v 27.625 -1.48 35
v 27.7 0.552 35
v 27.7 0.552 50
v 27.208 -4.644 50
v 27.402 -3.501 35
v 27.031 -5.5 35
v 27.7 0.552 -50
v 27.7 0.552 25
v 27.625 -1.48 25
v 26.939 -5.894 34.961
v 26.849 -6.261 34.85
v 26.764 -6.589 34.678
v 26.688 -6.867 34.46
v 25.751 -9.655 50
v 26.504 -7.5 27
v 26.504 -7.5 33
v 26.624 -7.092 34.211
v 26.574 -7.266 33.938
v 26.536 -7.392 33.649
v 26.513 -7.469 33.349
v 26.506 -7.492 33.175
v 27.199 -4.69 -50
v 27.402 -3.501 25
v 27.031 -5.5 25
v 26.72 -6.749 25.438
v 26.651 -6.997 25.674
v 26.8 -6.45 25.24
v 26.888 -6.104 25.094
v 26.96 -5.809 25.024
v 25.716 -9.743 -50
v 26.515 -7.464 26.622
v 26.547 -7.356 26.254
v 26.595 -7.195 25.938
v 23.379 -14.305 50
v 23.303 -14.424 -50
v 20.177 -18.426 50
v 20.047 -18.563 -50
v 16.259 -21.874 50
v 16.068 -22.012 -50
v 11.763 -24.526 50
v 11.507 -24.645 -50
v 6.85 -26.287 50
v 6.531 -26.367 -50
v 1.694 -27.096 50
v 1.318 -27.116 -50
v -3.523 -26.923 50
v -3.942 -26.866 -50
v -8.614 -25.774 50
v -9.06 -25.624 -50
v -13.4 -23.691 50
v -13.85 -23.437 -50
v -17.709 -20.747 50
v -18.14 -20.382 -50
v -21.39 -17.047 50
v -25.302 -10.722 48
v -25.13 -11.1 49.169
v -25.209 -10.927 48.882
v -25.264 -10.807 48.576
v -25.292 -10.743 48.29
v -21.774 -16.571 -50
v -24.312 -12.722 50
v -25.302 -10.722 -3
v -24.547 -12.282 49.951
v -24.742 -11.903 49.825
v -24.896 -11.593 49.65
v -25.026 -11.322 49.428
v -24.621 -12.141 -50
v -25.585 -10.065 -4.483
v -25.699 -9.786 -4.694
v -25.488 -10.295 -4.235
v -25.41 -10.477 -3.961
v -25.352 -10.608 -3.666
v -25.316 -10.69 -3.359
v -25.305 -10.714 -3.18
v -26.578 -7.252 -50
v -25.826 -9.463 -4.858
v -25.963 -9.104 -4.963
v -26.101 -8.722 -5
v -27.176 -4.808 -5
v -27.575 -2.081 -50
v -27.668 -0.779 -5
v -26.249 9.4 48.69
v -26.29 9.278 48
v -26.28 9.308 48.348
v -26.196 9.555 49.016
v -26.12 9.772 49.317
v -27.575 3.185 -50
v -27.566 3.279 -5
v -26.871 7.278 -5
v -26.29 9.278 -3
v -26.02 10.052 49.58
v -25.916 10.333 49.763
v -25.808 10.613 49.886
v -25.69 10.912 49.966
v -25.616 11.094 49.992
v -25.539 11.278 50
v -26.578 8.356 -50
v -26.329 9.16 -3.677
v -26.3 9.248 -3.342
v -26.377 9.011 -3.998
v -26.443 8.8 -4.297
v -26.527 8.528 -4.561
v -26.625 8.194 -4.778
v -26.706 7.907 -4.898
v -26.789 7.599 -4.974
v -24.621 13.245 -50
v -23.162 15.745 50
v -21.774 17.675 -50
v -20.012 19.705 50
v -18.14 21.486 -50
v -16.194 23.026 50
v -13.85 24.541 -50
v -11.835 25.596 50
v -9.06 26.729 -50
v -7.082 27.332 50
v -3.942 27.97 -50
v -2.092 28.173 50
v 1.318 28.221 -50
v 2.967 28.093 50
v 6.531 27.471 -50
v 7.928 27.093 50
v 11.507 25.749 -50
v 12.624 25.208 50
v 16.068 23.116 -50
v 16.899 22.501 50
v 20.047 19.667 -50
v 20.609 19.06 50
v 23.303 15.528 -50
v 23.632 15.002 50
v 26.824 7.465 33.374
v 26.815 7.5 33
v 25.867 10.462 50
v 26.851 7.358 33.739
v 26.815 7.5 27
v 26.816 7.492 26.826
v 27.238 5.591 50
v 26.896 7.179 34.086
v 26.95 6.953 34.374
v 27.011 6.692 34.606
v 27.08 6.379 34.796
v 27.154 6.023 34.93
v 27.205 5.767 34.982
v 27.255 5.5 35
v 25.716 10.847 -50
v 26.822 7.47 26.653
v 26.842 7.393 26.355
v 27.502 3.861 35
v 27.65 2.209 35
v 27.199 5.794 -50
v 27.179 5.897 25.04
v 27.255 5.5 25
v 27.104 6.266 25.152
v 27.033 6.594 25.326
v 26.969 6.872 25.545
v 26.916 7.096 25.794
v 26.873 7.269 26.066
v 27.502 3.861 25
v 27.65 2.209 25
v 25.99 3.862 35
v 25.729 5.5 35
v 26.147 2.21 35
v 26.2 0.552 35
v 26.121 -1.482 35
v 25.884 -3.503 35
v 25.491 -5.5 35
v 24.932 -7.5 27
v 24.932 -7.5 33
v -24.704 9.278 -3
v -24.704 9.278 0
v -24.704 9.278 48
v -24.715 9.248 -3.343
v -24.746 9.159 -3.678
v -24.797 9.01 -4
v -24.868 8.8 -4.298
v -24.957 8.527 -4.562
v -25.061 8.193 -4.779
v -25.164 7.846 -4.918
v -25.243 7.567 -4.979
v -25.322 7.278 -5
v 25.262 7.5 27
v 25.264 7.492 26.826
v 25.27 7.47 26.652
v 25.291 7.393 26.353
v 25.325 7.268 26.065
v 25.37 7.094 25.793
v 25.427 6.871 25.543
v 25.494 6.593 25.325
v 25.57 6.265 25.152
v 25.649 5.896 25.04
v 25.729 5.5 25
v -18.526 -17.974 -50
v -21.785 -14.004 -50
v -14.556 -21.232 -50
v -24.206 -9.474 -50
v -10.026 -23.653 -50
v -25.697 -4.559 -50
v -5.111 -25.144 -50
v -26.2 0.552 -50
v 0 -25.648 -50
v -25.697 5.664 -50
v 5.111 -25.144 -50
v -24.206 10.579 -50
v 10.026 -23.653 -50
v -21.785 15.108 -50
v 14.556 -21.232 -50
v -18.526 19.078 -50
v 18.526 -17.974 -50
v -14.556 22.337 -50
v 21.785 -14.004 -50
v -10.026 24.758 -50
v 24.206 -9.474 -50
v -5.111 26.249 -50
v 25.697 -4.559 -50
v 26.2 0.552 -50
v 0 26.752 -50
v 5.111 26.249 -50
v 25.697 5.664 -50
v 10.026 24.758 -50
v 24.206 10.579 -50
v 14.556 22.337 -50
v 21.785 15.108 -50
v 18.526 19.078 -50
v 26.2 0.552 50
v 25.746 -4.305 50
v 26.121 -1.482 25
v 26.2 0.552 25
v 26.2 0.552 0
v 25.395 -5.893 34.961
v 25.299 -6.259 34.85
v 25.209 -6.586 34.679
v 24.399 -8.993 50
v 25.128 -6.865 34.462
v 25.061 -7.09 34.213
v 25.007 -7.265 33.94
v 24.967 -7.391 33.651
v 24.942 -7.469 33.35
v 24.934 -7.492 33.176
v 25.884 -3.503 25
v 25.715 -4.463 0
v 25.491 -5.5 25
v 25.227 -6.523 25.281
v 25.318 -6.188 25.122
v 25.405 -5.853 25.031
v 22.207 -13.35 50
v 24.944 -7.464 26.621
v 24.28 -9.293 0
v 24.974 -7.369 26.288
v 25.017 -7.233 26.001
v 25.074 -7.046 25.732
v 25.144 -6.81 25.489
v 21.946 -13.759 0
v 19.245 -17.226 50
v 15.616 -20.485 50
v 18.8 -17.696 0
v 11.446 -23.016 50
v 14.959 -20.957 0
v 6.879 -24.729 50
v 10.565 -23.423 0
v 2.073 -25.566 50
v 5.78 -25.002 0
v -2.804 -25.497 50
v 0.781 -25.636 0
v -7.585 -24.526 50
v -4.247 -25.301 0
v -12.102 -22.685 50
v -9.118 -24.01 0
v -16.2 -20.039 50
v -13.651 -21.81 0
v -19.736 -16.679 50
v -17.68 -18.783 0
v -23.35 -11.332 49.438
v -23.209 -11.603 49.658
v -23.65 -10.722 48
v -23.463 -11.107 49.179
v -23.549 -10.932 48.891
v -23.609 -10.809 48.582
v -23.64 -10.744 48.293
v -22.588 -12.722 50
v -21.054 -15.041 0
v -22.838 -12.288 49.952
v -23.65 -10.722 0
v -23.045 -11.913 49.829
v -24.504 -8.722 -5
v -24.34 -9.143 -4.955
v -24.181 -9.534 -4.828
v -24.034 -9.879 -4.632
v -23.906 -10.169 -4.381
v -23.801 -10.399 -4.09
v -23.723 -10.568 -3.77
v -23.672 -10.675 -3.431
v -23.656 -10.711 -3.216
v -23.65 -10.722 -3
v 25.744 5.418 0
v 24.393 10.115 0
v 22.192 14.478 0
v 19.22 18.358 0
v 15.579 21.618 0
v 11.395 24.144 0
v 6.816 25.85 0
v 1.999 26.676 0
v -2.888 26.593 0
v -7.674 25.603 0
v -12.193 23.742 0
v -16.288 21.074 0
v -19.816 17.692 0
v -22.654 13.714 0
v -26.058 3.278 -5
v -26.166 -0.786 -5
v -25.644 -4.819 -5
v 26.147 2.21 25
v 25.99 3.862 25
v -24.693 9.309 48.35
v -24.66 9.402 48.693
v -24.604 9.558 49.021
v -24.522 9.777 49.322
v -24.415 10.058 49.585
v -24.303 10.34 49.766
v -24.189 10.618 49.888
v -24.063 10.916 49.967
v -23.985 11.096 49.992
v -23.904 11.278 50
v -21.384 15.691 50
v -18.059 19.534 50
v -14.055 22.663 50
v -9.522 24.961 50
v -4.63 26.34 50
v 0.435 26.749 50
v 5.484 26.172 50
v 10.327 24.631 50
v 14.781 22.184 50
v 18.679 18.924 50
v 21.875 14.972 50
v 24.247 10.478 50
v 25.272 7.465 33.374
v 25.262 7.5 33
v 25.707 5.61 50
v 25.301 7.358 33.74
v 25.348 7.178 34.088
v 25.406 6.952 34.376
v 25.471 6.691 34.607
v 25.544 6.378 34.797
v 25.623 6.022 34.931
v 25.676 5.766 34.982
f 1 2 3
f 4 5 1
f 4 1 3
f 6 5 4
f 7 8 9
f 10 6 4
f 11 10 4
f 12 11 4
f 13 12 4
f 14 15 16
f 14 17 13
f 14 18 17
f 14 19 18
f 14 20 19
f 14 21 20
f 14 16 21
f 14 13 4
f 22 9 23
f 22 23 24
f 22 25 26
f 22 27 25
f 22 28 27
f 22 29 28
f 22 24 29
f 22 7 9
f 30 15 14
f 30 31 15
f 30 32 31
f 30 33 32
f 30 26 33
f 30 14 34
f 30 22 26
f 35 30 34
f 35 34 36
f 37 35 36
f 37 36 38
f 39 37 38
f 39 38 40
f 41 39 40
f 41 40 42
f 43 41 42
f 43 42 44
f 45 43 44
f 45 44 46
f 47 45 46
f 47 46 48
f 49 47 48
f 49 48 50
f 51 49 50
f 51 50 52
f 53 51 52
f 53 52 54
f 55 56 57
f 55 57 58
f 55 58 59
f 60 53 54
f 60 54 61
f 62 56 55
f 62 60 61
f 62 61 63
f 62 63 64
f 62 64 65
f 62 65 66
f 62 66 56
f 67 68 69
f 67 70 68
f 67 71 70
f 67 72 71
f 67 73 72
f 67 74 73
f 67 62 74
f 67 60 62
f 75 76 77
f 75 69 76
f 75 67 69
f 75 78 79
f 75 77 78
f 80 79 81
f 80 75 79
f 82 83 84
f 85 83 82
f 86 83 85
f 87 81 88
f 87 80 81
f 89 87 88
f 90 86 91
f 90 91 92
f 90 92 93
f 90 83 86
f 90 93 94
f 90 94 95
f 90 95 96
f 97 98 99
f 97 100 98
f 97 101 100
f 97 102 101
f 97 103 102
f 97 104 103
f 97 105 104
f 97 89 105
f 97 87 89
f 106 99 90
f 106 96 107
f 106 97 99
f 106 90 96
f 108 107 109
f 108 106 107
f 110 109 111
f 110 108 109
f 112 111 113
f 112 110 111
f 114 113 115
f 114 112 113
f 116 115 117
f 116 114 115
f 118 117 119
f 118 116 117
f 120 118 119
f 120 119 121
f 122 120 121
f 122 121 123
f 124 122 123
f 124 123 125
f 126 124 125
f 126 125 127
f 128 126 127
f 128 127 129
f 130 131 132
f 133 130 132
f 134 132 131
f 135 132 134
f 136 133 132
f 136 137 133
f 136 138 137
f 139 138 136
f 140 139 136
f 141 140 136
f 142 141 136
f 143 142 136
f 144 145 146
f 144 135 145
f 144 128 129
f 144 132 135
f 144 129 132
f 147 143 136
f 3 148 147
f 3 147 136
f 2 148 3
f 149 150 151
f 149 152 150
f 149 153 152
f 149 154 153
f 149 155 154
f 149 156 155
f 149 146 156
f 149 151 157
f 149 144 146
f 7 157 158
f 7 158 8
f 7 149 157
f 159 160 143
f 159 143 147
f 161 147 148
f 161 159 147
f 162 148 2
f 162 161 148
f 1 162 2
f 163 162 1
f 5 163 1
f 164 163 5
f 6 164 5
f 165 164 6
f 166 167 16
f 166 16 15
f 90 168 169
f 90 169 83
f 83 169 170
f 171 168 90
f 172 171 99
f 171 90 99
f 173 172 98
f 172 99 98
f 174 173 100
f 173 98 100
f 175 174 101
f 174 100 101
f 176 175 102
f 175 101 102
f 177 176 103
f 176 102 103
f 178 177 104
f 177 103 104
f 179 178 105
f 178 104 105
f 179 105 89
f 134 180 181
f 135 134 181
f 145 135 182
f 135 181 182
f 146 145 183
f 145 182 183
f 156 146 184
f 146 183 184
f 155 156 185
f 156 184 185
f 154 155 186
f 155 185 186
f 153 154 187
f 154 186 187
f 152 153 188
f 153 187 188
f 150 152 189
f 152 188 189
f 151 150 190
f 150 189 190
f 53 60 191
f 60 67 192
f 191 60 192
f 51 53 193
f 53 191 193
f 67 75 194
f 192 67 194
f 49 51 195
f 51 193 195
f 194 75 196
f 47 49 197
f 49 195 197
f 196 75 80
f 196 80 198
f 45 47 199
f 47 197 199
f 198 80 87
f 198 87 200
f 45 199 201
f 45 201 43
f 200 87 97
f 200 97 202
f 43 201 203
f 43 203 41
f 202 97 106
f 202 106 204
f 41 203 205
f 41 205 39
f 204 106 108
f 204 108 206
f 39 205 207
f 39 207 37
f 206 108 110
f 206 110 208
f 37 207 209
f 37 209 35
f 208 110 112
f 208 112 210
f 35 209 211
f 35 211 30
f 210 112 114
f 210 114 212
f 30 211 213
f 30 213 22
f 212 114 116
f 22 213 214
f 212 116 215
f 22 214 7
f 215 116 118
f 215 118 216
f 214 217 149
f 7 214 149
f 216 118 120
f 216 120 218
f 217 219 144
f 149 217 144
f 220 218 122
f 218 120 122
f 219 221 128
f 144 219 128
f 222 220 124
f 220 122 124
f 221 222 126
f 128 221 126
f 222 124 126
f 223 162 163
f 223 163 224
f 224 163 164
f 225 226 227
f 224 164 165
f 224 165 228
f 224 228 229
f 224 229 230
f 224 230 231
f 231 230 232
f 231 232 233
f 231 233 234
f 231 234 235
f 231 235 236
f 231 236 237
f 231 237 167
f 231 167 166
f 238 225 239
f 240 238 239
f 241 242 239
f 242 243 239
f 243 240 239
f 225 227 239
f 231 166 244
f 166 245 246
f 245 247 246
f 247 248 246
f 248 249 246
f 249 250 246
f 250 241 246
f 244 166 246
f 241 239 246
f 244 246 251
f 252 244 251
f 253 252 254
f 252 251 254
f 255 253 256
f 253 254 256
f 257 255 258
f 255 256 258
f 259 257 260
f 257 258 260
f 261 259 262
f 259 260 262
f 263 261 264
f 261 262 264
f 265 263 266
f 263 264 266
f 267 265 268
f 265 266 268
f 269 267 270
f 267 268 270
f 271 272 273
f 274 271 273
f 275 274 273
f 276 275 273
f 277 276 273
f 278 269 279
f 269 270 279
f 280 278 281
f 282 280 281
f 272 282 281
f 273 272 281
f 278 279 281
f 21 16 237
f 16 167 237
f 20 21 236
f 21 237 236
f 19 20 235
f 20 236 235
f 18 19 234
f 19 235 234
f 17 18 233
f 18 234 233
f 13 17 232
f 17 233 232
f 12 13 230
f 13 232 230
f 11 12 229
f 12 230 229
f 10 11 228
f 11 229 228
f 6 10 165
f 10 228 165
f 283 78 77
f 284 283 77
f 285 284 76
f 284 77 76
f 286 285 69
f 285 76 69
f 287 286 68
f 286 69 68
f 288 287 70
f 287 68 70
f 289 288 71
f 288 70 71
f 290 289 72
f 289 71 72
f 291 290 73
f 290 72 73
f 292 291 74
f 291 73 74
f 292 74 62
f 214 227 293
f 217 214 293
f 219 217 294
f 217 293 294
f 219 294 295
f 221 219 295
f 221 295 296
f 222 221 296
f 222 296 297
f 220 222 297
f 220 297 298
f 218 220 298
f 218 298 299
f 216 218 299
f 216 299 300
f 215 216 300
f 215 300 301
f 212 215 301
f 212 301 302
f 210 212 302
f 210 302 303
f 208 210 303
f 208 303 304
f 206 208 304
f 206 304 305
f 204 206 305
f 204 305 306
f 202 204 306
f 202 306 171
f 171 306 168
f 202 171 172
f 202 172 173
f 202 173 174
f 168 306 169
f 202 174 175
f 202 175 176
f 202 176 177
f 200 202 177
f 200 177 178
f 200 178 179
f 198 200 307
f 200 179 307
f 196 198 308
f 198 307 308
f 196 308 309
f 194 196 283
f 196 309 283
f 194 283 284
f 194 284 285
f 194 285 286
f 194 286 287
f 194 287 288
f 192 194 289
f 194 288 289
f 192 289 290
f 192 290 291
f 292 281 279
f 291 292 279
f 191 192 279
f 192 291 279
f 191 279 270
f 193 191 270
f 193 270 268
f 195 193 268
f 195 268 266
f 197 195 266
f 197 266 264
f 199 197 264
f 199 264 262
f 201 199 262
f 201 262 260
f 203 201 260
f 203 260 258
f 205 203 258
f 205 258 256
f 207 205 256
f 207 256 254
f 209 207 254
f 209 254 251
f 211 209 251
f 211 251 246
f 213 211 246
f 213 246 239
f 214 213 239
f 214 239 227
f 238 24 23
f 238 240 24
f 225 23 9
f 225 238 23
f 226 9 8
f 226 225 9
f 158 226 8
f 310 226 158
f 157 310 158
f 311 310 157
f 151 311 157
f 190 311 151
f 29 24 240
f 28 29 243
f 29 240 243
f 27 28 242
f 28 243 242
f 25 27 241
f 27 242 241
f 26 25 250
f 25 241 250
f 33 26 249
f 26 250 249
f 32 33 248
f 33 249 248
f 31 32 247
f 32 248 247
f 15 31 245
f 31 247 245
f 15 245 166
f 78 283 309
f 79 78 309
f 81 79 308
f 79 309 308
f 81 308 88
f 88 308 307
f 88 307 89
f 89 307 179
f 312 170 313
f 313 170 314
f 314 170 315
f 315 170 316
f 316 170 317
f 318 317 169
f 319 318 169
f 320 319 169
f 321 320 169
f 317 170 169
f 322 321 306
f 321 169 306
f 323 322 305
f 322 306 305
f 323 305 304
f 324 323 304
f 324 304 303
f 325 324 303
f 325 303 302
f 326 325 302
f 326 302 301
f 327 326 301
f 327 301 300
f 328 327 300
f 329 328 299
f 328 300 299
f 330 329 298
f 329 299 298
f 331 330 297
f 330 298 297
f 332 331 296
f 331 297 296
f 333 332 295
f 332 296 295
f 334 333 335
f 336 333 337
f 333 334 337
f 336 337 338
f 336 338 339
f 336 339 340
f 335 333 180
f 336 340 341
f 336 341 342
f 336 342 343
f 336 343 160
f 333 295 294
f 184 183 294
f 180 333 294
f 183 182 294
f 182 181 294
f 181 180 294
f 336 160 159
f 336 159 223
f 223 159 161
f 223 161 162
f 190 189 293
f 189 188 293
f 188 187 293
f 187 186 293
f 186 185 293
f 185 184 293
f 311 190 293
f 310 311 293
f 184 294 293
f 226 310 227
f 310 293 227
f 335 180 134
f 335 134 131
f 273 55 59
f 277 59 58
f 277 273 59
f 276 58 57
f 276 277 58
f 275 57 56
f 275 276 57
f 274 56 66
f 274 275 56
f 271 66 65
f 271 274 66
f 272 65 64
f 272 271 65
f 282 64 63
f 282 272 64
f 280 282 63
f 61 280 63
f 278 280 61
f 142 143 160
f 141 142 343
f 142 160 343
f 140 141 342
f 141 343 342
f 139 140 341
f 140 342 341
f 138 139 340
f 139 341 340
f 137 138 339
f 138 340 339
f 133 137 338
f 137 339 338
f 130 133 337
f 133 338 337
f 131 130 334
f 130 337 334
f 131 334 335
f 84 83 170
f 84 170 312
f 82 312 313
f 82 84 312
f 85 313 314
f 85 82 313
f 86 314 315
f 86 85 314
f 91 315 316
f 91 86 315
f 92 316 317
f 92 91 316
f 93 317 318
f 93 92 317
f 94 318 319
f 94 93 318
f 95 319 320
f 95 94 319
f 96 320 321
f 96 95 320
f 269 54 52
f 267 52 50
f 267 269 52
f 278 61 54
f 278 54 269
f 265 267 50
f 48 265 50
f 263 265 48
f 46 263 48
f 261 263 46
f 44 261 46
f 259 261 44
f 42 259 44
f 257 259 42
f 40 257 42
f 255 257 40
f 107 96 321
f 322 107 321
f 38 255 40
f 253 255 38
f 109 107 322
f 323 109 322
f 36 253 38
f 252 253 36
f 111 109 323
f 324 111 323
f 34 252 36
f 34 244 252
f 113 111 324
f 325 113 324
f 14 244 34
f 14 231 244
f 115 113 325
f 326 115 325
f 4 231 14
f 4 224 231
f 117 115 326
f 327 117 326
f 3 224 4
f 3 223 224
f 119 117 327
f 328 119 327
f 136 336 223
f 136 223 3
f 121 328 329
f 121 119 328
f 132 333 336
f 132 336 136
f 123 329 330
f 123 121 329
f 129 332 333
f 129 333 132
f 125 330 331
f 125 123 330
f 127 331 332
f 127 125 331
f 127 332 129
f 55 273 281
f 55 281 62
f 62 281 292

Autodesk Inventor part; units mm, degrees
ref_plane "YZ Plane" through (0, 0, 0) normal (1, 0, 0) x (0, 1, 0)
ref_plane "XZ Plane" through (0, 0, 0) normal (0, 1, 0) x (-1, 0, 0)
ref_plane "XY Plane" through (0, 0, 0) normal (0, 0, 1) x (1, 0, 0)
ref_plane "Arbeitsebene1" through (0, 0, 0) normal (0, 0, 1) x (1, 0, 0)
sketch "Skizze1" plane through (0, 0, 0) normal (0, 0, 1) x (1, 0, 0)
  circle A0 centre (0, 0.5522) radius 27.7
  circle A1 centre (0, 0.5522) radius 26.2
  point P0 (0, 0)
  dimension "d11" = 52.4
  dimension "d12" = 55.4
extrude "Extrusion1" add sketch "Skizze1" along normal mid plane 100
sketch "Skizze3" plane through (0, 0, 0) normal (1, 0, 0) x (0, 1, 0)
  line L0 (-27.1478, -50) -> (-27.1478, 50) projected
  line L1 (28.2522, -50) -> (28.2522, 50) projected
  line L2 (9.2777, 59.671) -> (-10.7223, 59.671)
  line L3 (-10.7223, 59.671) -> (-10.7223, -5)
  line L4 (-10.7223, -5) -> (9.2777, -5)
  line L5 (9.2777, -5) -> (9.2777, 59.671)
  line L6 (9.2777, 59.671) -> (-10.7223, -5) construction
  line L7 (-10.7223, 59.671) -> (9.2777, -5) construction
  line L8 (0.5522, 50) -> (0.5522, 50) projected
  point P0 (0, 0)
  point P1 (-0.7223, 27.3355)
  dimension "d13" = 20
  dimension "d14" = 55
extrude "Extrusion3" cut sketch "Skizze3" against normal blind 75
fillet "Rundung1" radius 2 4 edges at (-25.4971, 9.2777, 50) (-25.4971, 9.2777, -5) (-24.4759, -10.7223, 50) (-24.4759, -10.7223, -5)
sketch "Skizze4" plane through (0, 0, 0) normal (1, 0, 0) x (0, 1, 0)
  line L0 (-10.7223, 48) -> (-10.7223, -3) projected
  line L1 (-8.7223, -5) -> (7.2777, -5) projected
  line L2 (9.2777, -3) -> (9.2777, 48) projected
  line L3 (-12.7223, 50) -> (11.2777, 50) projected
  line L4 (-27.1478, -50) -> (28.2522, -50) projected
  line L5 (5.5, 35) -> (-5.5, 35)
  line L6 (-7.5, 33) -> (-7.5, 27)
  line L7 (-5.5, 25) -> (5.5, 25)
  line L8 (7.5, 27) -> (7.5, 33)
  line L9 (7.5, 35) -> (-7.5, 25) construction
  line L10 (-7.5, 35) -> (7.5, 25) construction
  line L11 (-25.6478, 50) -> (26.7522, 50) projected
  line L12 (-2.9499, 34.5) -> (4.0501, 34.5) projected
  arc A0 (7.5, 33) -> (5.5, 35) centre (5.5, 33) ccw
  arc A1 (-5.5, 35) -> (-7.5, 33) centre (-5.5, 33) ccw
  arc A2 (-7.5, 27) -> (-5.5, 25) centre (-5.5, 27) ccw
  arc A3 (5.5, 25) -> (7.5, 27) centre (5.5, 27) ccw
  point P0 (0, 0)
  point P1 (0, 30)
  dimension "d18" = 15
  dimension "d19" = 10
  dimension "d20" = 15
  dimension "d21" = 2
extrude "Extrusion4" cut sketch "Skizze4" along normal through all
properties part number "Planktoscope_connectortube"
